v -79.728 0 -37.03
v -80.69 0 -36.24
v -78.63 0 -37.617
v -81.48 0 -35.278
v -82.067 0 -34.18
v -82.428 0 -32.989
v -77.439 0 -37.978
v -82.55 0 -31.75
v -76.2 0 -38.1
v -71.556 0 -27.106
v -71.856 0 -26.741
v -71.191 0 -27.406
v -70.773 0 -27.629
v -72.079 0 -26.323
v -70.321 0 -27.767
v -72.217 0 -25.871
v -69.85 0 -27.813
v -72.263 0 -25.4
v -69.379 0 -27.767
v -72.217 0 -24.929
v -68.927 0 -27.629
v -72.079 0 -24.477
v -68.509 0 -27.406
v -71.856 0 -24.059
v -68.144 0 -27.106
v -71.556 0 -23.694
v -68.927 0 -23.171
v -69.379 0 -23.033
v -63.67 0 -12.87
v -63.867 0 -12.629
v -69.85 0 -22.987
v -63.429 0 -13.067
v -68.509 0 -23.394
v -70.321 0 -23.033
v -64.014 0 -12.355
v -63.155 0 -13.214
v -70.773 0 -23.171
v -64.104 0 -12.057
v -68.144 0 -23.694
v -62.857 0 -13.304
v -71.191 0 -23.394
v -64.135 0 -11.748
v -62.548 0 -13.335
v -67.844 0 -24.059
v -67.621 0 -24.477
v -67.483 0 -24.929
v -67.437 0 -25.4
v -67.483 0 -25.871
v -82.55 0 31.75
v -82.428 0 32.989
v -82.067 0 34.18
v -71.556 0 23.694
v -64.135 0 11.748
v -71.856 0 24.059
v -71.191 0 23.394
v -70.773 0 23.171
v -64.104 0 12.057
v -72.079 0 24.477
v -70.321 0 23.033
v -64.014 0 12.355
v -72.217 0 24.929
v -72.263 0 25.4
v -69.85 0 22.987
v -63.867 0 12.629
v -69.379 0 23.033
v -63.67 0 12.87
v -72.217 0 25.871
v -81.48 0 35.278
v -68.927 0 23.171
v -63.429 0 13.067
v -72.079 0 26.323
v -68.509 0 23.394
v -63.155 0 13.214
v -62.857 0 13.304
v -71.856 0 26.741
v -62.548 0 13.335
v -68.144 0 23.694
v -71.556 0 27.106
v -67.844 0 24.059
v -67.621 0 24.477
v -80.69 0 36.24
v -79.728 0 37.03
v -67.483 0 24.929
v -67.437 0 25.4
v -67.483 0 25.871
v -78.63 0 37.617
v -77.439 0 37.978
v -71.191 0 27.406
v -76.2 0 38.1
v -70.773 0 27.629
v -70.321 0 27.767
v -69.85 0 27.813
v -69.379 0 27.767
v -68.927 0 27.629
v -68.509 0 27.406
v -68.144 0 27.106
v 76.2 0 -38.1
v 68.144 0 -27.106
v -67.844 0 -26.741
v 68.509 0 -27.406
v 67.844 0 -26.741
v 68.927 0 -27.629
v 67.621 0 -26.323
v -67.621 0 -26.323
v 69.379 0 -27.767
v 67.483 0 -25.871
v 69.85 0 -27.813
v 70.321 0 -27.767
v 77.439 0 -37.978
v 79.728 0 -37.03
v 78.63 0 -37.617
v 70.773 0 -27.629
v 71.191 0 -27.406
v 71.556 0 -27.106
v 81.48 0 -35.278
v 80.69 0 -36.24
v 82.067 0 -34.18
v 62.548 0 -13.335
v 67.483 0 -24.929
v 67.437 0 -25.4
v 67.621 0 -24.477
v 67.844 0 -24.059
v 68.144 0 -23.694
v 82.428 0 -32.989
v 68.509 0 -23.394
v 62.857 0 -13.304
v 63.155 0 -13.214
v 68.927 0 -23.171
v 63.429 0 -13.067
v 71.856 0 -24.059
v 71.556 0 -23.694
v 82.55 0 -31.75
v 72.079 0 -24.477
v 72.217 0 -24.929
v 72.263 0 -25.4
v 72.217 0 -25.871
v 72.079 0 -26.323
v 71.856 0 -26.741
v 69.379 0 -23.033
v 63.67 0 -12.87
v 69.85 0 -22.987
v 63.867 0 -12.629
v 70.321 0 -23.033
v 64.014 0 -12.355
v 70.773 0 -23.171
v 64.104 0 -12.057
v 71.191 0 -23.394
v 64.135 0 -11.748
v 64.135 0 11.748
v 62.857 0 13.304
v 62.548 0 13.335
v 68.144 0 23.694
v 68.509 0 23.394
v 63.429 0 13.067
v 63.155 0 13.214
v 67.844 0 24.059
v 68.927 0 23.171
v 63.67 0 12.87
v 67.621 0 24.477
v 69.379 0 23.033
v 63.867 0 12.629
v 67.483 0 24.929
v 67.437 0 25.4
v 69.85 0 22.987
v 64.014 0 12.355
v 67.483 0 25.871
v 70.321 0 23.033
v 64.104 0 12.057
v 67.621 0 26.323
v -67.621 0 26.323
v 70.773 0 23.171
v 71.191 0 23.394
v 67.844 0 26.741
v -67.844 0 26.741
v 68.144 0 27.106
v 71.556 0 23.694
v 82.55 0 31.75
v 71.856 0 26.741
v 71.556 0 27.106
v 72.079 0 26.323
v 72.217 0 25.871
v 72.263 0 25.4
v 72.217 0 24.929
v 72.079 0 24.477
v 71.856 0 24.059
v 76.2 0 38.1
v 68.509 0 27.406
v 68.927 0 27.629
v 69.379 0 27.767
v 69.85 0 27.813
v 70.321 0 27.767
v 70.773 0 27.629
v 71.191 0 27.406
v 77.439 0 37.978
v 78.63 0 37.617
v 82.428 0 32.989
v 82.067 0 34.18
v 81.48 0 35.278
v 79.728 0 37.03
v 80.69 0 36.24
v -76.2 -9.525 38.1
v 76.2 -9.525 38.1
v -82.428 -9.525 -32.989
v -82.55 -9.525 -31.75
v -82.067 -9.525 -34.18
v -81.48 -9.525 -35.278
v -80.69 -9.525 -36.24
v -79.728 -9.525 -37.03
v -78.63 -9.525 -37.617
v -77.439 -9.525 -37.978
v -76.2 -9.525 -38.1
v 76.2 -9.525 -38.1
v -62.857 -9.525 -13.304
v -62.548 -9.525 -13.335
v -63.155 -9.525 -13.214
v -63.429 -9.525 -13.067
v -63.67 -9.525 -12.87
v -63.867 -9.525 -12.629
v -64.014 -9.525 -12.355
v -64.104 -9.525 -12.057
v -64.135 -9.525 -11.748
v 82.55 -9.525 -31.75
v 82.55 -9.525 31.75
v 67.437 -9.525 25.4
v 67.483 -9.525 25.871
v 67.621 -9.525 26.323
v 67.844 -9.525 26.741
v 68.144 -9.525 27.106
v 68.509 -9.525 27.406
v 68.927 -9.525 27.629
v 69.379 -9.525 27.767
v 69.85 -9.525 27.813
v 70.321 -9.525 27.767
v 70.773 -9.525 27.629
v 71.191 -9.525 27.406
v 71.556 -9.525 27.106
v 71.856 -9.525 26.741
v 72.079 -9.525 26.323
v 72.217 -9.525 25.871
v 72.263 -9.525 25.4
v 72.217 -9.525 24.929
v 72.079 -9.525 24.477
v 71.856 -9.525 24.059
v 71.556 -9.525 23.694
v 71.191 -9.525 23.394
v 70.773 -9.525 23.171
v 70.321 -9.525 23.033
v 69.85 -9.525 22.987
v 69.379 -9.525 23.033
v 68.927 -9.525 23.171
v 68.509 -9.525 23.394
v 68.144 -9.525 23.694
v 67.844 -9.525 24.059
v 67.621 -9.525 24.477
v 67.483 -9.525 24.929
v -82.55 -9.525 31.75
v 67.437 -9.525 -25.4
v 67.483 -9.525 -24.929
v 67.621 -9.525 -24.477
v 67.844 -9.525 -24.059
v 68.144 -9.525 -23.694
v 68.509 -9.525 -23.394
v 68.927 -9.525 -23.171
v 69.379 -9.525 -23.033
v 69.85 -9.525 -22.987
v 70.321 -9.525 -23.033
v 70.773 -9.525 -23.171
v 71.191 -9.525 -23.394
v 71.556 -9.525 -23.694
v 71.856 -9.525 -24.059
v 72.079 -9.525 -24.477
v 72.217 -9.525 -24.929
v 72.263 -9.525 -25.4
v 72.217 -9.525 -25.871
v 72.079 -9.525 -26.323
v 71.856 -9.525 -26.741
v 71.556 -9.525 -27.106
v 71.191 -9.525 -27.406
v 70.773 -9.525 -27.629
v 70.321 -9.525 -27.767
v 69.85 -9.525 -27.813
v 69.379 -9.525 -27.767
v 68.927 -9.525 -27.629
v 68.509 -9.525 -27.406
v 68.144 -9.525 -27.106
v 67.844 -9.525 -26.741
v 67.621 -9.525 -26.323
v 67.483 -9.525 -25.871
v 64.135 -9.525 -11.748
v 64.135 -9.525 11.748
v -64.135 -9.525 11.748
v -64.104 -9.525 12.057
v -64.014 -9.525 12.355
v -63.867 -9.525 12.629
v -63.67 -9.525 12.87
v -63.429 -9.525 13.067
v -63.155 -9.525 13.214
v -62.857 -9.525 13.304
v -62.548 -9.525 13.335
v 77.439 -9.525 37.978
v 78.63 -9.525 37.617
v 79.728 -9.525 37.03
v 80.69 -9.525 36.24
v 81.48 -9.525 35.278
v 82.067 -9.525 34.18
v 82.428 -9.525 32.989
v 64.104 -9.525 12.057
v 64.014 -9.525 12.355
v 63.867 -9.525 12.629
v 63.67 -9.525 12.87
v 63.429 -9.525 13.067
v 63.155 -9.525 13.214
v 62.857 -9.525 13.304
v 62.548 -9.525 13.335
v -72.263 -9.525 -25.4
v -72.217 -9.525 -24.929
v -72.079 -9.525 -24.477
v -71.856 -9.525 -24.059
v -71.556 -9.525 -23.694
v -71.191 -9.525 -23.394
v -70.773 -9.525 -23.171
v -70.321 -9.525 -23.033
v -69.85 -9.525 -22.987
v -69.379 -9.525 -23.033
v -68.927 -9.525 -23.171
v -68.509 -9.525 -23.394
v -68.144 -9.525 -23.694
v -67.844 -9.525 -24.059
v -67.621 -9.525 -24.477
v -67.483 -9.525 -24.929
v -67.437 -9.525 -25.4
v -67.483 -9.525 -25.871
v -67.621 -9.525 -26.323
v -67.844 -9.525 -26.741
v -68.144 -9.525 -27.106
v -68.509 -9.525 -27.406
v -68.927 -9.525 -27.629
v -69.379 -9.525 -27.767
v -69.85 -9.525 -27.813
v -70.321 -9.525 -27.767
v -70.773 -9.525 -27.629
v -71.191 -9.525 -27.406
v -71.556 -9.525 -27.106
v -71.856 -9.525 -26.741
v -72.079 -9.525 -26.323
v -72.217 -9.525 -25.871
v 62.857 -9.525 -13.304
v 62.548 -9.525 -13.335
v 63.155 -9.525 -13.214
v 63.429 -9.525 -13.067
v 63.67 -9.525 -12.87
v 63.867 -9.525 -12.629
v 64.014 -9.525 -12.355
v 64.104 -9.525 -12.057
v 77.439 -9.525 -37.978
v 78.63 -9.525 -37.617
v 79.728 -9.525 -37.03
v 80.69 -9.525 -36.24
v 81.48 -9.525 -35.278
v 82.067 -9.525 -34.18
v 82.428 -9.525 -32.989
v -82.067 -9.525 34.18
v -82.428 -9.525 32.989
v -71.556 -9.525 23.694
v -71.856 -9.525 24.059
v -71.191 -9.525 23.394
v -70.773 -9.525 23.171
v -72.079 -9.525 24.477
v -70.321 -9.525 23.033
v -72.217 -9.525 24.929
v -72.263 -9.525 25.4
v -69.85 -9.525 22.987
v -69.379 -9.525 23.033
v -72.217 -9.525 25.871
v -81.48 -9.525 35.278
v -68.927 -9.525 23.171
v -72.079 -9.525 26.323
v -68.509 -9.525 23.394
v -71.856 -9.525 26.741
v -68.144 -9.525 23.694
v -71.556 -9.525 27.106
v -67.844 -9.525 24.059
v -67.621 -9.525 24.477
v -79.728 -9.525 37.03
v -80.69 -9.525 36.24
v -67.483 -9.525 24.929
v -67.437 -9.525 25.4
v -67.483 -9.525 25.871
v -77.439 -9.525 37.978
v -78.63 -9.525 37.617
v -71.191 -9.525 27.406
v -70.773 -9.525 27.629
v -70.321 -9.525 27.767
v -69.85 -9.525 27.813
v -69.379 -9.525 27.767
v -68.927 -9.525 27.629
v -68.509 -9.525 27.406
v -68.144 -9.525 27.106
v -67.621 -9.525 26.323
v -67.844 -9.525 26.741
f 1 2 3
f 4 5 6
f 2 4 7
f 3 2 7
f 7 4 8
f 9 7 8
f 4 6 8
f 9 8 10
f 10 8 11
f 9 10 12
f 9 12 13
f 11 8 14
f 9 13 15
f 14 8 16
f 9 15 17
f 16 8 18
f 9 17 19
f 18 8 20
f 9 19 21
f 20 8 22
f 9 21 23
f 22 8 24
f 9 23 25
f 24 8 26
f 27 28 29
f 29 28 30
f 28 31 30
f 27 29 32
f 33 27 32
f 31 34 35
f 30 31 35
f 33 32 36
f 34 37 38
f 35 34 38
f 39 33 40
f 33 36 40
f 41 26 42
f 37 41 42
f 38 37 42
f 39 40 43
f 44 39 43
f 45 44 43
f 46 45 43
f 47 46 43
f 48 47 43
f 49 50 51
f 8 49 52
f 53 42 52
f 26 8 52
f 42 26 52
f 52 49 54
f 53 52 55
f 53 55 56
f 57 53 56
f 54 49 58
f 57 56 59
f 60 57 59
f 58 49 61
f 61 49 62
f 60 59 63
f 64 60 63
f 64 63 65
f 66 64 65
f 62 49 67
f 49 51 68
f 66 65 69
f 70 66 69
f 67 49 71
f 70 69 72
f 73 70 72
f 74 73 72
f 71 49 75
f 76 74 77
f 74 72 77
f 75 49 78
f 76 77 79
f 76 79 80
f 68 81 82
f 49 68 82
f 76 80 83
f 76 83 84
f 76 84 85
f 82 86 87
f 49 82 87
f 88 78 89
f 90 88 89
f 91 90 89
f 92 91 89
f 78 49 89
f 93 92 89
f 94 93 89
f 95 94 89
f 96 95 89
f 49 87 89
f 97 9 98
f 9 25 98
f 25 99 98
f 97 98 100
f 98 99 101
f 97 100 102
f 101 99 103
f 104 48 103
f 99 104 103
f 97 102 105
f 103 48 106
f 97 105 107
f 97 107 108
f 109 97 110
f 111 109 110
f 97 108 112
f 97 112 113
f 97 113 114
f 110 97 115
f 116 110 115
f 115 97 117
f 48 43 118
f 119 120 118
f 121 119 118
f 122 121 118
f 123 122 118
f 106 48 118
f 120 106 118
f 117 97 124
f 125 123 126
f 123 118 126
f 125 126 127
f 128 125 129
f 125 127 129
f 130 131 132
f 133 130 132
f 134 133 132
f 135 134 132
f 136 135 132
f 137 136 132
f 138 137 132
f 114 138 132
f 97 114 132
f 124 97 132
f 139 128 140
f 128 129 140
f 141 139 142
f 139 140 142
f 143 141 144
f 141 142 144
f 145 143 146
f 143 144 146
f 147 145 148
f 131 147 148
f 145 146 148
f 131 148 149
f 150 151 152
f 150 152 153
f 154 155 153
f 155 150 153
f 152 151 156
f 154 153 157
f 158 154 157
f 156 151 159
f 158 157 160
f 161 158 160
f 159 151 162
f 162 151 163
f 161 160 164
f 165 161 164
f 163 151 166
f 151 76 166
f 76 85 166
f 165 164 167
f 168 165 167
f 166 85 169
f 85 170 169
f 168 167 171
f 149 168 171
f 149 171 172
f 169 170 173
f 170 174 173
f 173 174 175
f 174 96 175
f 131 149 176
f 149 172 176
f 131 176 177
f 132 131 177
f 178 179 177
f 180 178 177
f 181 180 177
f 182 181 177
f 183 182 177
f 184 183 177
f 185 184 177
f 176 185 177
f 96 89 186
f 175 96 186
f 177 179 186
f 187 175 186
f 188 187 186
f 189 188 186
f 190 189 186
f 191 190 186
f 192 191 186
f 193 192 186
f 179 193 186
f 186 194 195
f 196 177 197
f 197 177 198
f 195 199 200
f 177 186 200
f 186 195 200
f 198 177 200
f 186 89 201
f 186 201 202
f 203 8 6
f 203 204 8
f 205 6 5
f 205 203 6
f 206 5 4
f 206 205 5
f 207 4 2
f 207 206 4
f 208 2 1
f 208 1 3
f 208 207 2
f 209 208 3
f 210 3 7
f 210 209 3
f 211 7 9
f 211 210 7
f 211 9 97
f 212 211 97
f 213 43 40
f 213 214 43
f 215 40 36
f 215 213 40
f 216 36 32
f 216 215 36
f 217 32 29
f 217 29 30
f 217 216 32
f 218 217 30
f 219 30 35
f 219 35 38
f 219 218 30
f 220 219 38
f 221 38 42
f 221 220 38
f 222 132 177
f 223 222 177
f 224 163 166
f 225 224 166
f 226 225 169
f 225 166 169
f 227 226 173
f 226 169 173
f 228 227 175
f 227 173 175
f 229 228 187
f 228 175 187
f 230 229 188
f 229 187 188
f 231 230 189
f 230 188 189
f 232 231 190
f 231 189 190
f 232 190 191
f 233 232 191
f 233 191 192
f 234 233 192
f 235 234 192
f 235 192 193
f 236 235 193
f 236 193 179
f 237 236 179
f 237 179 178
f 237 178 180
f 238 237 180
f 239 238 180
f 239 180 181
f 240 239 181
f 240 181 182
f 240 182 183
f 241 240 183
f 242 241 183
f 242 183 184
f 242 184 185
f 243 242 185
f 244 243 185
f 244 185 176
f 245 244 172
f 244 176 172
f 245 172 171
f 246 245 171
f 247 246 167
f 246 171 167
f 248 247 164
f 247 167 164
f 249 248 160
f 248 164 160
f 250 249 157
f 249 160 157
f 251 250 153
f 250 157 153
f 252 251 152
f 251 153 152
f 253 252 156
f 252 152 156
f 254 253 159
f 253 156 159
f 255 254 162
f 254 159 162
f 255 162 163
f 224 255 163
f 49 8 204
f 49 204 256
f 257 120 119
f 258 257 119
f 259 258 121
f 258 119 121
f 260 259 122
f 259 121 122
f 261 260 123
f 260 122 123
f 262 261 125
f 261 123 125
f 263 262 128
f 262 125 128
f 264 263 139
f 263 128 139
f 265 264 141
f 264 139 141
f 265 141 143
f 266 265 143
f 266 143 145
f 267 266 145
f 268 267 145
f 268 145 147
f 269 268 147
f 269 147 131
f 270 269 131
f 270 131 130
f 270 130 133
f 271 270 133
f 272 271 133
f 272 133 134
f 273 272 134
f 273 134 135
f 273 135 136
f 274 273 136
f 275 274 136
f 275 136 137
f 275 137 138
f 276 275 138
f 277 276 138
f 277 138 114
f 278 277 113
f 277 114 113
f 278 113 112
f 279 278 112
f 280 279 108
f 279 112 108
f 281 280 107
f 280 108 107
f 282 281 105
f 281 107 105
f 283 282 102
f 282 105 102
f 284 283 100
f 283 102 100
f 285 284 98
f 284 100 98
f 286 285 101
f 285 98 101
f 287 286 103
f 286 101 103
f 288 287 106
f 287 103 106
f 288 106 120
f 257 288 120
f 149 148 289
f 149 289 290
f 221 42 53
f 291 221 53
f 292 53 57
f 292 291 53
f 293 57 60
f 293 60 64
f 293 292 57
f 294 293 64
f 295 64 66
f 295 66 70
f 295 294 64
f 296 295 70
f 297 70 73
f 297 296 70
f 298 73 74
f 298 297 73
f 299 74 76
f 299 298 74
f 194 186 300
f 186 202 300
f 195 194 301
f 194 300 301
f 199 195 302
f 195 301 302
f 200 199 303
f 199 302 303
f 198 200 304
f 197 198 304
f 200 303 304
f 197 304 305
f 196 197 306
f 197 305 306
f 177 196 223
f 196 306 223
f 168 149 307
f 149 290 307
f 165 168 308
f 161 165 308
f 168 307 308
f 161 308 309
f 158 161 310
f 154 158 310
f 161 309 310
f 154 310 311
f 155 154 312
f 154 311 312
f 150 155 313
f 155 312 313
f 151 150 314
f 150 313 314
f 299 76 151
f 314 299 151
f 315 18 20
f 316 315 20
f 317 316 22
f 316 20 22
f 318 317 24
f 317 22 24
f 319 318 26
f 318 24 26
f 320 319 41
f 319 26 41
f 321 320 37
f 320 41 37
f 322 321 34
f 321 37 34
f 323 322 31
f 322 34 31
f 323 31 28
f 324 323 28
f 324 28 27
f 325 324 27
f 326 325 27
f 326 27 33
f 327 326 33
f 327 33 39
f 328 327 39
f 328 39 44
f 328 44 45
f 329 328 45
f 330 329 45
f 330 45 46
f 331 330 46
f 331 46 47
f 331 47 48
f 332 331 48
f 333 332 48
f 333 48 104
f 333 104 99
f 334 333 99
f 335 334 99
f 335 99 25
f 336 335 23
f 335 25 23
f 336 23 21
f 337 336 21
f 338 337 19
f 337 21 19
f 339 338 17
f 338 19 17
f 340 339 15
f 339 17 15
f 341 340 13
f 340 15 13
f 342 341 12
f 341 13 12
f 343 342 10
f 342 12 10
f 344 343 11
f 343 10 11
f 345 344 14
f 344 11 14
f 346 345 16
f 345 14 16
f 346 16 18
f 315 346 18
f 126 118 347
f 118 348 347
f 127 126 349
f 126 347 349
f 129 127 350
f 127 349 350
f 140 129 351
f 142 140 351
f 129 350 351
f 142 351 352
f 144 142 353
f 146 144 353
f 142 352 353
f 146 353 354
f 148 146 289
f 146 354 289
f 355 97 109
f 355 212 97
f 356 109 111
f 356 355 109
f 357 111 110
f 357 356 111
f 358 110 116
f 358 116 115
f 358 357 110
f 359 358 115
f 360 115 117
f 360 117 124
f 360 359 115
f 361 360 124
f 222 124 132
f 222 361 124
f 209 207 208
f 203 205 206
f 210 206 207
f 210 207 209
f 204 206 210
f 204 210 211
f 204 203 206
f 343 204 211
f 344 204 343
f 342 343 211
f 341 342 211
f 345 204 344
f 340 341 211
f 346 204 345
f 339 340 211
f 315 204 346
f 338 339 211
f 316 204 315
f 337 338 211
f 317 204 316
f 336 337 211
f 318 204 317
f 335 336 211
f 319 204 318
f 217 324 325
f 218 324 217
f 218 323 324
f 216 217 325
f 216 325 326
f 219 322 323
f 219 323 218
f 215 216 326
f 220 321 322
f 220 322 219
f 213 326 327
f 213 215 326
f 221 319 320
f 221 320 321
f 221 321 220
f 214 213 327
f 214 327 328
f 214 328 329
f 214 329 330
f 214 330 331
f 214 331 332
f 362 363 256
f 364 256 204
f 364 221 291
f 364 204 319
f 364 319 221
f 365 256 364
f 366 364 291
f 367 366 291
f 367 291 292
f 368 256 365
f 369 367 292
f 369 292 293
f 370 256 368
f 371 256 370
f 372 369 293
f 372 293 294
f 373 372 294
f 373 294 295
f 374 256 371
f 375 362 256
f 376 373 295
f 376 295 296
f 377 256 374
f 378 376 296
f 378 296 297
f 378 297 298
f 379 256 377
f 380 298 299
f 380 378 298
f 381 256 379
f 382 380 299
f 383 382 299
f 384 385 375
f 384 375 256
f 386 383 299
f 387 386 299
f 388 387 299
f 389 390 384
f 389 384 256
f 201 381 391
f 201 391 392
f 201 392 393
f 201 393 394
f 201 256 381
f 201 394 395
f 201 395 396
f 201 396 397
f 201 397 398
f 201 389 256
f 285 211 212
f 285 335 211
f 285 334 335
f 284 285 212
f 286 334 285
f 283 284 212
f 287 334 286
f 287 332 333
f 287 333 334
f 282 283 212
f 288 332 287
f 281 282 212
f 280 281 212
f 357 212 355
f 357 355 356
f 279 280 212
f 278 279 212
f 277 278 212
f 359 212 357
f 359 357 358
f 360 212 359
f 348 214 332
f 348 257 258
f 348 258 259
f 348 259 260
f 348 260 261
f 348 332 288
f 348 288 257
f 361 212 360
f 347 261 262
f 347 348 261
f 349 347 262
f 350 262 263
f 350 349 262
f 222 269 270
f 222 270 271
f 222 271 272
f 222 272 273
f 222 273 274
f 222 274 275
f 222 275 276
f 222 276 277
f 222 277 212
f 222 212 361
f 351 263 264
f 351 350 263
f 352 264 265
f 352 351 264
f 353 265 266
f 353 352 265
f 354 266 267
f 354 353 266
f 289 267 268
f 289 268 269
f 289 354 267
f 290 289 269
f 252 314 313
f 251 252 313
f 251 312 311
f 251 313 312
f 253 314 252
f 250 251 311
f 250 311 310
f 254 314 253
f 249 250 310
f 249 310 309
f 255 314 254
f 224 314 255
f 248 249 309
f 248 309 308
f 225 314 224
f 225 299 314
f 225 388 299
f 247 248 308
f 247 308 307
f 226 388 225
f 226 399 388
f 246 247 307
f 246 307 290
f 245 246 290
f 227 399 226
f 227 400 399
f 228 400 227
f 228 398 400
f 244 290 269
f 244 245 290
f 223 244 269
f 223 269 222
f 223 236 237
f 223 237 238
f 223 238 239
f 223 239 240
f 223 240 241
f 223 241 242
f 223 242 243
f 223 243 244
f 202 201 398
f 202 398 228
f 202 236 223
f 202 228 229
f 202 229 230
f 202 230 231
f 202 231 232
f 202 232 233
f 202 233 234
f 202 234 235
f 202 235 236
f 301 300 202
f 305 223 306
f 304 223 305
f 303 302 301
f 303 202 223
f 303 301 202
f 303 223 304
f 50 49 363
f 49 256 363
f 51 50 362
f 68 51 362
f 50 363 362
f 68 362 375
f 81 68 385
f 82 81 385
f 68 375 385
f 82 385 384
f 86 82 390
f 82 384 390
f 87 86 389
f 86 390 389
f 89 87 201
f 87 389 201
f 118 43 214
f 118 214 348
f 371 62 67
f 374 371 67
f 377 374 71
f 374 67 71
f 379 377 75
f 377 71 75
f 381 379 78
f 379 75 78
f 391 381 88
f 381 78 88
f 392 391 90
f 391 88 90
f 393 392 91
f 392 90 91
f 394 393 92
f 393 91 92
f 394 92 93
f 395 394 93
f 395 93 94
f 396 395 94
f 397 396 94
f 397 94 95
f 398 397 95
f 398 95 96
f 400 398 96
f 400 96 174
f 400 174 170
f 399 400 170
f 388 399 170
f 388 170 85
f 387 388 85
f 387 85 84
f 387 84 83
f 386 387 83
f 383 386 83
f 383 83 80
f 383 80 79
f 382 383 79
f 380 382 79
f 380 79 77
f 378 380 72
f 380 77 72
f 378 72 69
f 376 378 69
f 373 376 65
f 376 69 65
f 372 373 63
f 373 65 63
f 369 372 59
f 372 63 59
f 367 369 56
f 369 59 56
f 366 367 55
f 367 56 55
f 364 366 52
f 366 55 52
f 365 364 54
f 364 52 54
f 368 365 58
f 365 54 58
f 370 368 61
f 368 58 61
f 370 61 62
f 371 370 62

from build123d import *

# Parameters (mm, degrees)
F0_W     = 165.1
F0_H     = 76.2
F0_W_2   = 128.27
F0_H_2   = 26.67
F1_DEPTH = 9.525
F3_D     = 4.826
F4_R     = 1.5875
F5_R     = 6.35


with BuildPart() as f1:
    # F0 (on Front) → F1 (new body)
    with BuildSketch(Plane.XZ):
        Rectangle(F0_W, F0_H)
        Rectangle(F0_W_2, F0_H_2, mode=Mode.SUBTRACT)
    extrude(amount=F1_DEPTH)

    # F3 (through all)
    with Locations(Plane.XZ.offset(9.525)):
        with Locations((-69.85, 25.4), (69.85, 25.4), (69.85, -25.4), (-69.85, -25.4)):
            Hole(F3_D / 2)

    # F4
    f4_edges = [f1.edges().sort_by_distance(p)[0] for p in [
        (-64.135, -4.7625, 13.335),
        (-64.135, -4.7625, -13.335),
        (64.135, -4.7625, -13.335),
        (64.135, -4.7625, 13.335),
    ]]
    fillet(f4_edges, radius=F4_R)

    # F5
    f5_edges = [f1.edges().sort_by_distance(p)[0] for p in [
        (82.55, -4.7625, 38.1),
        (-82.55, -4.7625, 38.1),
        (82.55, -4.7625, -38.1),
        (-82.55, -4.7625, -38.1),
    ]]
    fillet(f5_edges, radius=F5_R)


solid = f1.part
